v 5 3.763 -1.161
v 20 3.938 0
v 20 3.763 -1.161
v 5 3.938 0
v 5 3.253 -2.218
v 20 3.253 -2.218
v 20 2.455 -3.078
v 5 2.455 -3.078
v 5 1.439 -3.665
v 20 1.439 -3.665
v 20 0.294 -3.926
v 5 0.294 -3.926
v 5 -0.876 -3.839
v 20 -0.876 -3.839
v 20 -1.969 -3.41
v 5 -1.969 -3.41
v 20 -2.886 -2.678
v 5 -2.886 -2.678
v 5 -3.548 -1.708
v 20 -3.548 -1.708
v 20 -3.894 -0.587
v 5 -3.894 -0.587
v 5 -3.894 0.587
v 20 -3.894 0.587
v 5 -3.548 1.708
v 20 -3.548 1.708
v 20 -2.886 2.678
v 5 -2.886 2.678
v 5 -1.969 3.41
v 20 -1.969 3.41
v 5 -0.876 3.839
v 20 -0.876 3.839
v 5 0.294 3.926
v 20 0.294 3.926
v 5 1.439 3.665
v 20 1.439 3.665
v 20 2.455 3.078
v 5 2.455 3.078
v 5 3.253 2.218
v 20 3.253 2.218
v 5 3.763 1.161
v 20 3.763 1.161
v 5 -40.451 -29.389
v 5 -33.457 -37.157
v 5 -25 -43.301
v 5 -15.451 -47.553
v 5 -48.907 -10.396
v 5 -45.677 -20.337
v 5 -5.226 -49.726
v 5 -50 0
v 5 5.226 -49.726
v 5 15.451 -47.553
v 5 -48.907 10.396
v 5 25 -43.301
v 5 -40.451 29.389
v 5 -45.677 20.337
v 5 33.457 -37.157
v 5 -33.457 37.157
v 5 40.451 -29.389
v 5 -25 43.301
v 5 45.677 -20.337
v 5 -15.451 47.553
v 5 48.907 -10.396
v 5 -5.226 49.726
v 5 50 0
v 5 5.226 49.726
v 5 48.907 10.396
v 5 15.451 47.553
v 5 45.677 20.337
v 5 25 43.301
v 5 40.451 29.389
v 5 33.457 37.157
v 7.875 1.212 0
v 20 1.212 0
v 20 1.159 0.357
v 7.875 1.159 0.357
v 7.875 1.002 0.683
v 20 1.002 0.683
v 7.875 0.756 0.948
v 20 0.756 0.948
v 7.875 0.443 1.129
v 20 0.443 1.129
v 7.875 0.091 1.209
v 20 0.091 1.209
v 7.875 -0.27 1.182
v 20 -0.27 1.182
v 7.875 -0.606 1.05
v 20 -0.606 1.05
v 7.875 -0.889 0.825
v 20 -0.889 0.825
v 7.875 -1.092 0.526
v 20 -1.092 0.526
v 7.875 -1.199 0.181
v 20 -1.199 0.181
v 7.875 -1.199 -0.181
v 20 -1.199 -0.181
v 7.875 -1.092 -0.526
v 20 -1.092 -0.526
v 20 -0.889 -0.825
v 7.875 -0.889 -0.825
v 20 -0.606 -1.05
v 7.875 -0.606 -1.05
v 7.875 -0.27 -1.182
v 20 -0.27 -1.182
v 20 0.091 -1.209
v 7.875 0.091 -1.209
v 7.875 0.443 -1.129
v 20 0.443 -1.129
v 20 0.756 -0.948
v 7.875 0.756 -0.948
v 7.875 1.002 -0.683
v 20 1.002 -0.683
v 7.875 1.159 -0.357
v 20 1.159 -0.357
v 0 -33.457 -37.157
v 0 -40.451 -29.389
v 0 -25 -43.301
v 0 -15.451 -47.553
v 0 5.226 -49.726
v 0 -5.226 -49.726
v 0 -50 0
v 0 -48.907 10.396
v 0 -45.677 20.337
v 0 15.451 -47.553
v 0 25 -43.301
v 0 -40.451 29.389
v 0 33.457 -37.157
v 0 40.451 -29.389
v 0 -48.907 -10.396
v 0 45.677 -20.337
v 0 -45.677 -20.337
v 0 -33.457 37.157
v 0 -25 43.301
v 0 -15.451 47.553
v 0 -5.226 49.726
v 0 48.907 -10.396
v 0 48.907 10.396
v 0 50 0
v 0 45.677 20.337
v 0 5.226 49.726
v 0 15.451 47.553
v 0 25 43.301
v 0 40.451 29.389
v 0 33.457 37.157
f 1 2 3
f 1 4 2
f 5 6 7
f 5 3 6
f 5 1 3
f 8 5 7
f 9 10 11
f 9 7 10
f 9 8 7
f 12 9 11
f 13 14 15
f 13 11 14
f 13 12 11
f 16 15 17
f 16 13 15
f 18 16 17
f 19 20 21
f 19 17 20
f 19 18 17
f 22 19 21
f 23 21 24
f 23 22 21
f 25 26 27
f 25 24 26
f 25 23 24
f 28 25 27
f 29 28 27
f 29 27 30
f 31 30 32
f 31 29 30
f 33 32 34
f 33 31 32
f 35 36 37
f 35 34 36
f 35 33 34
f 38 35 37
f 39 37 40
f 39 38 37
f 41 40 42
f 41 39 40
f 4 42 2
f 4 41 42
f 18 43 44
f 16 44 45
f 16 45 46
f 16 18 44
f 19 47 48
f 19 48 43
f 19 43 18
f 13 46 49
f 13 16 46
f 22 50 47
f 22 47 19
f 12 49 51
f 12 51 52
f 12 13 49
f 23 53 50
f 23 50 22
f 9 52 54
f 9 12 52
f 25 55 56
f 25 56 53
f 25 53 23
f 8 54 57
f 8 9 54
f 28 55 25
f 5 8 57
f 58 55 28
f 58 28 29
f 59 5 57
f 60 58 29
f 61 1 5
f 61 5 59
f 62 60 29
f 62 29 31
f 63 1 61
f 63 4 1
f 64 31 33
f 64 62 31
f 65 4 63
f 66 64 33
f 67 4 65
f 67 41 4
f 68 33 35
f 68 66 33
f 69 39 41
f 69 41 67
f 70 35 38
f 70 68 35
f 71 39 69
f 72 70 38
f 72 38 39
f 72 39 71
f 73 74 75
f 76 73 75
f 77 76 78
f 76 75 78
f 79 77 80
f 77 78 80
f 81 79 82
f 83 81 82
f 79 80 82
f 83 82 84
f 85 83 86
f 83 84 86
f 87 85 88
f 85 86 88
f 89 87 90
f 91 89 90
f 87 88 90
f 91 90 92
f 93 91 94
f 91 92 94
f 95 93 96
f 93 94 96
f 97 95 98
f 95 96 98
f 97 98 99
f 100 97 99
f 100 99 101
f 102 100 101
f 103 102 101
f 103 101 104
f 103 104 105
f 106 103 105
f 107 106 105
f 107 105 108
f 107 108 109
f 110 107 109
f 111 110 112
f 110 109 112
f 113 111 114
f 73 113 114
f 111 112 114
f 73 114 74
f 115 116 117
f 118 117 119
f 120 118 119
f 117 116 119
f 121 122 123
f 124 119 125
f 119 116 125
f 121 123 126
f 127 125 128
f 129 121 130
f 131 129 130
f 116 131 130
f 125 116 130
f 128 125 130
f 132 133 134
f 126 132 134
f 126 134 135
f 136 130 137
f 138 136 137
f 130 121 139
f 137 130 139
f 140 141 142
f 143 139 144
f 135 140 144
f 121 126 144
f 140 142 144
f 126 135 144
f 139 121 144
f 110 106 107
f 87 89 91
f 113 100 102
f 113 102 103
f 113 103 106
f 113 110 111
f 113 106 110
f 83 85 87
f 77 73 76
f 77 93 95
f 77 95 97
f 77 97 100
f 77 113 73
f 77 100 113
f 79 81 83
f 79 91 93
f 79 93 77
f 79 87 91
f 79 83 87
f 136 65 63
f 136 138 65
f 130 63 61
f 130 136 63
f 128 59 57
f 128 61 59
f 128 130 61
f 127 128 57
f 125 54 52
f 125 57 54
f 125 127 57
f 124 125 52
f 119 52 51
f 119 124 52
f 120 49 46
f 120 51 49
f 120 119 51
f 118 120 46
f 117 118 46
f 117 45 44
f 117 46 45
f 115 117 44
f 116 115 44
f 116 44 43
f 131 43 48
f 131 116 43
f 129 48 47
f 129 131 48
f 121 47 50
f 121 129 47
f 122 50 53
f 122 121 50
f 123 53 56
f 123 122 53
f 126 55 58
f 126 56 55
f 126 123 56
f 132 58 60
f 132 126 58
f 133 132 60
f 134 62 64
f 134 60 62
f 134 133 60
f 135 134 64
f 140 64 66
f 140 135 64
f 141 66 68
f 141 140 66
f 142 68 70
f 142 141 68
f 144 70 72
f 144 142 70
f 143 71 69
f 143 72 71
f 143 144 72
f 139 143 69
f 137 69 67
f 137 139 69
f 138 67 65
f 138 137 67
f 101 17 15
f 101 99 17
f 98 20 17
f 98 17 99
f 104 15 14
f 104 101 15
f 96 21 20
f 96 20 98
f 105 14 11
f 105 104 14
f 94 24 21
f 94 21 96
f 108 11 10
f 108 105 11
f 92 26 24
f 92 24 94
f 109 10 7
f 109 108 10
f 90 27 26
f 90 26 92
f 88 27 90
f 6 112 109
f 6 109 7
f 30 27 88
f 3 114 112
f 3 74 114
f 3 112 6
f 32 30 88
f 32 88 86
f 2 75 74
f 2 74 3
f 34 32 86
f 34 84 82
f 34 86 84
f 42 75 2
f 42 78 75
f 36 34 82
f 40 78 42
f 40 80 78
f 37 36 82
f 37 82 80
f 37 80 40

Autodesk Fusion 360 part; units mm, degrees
sketch "Sketch1" plane through (0, 0, 0) normal (1, 0, 0) x (0, 1, 0)
  circle A0 centre (0, 0) radius 50
  dimension "d1" = 100
extrude "Extrude1" add sketch "Sketch1" along normal blind 5
sketch "Sketch2" plane through (5, 0, 0) normal (1, 0, 0) x (0, 1, 0)
  circle A0 centre (0, 0) radius 50
  circle A1 centre (0, 0) radius 3.9375
  dimension "d4" = 7.875
extrude "Extrude3" add sketch "Sketch2" along normal blind 15 contours A1
sketch "Sketch3" plane through (20, 0, 0) normal (1, 0, 0) x (0, 1, 0)
  circle A0 centre (0, 0) radius 3.9375
  circle A1 centre (0, 0) radius 1.2125
  dimension "d10" = 2.425
extrude "Extrude4" cut sketch "Sketch3" against normal blind 12.125 contours A1
sketch "Sketch4" plane through (5, 0, 0) normal (1, 0, 0) x (0, 1, 0)
  circle A0 centre (0, 0) radius 50
  line L0 (-33.6779, 28.9291) -> (-27.8766, 32.541)
  line L1 (-27.8766, 32.541) -> (-24.8659, 32.541)
  spline S0 degree 3 poles (-24.8659, 32.541) (-24.773, 32.541) (-24.6881, 32.4676) (-24.6881, 32.363) knots 0 0 0 0 1 1 1 1
  spline S1 degree 3 poles (-24.6881, 32.363) (-24.6881, 32.2781) (-24.7268, 32.2432) (-24.773, 32.2162) knots 0 0 0 0 1 1 1 1
  line L2 (-24.773, 32.2162) -> (-27.6216, 30.5068)
  spline S2 degree 3 poles (-27.6216, 30.5068) (-27.8071, 30.3947) (-27.8728, 30.1742) (-27.8728, 30.008) knots 0 0 0 0 1 1 1 1
  line L3 (-27.8728, 30.008) -> (-27.8766, 28.9291)
  line L4 (-27.8766, 28.9291) -> (-24.2551, 28.9291)
  line L5 (-24.2551, 28.9291) -> (-24.2551, 35.1902)
  spline S3 degree 3 poles (-24.2551, 35.1902) (-24.2551, 35.31) (-24.348, 35.4144) (-24.4871, 35.4144) knots 0 0 0 0 1 1 1 1
  line L6 (-24.4871, 35.4144) -> (-27.9423, 35.4144)
  line L7 (-27.9423, 35.4144) -> (-33.7281, 31.8179)
  line L8 (-33.7281, 31.8179) -> (-33.7281, 28.9291)
  line L9 (-33.7281, 28.9291) -> (-33.6779, 28.9291)
  line L10 (13.8915, 28.9289) -> (19.1092, 28.9289)
  line L11 (19.1092, 28.9289) -> (19.1092, 30.3328)
  line L12 (19.1092, 30.3328) -> (15.5457, 30.3328)
  line L13 (15.5457, 30.3328) -> (15.5457, 31.5083)
  line L14 (15.5457, 31.5083) -> (18.4135, 31.5083)
  line L15 (18.4135, 31.5083) -> (18.4135, 32.9161)
  line L16 (18.4135, 32.9161) -> (15.5457, 32.9161)
  line L17 (15.5457, 32.9161) -> (15.5457, 34.0104)
  line L18 (15.5457, 34.0104) -> (19.1092, 34.0104)
  line L19 (19.1092, 34.0104) -> (19.1092, 35.4144)
  line L20 (19.1092, 35.4144) -> (13.8915, 35.4144)
  line L21 (13.8915, 35.4144) -> (13.8915, 28.9289)
  line L22 (-18.8945, 35.4144) -> (-21.3798, 28.9289)
  line L23 (-21.3798, 28.9289) -> (-19.6714, 28.9289)
  line L24 (-19.6714, 28.9289) -> (-19.2386, 30.1433)
  line L25 (-19.2386, 30.1433) -> (-16.4635, 30.1433)
  line L26 (-16.4635, 30.1433) -> (-16.0384, 28.9289)
  line L27 (-16.0384, 28.9289) -> (-14.2721, 28.9289)
  line L28 (-14.2721, 28.9289) -> (-16.7881, 35.4144)
  line L29 (-16.7881, 35.4144) -> (-18.8945, 35.4144)
  line L30 (-18.7477, 31.5238) -> (-17.8394, 34.0646)
  line L31 (-17.8394, 34.0646) -> (-16.9467, 31.5238)
  line L32 (-16.9467, 31.5238) -> (-18.7477, 31.5238)
  line L33 (-7.1839, 34.0104) -> (-5.093, 34.0104)
  line L34 (-5.093, 34.0104) -> (-5.093, 28.9289)
  line L35 (-5.093, 28.9289) -> (-3.4426, 28.9289)
  line L36 (-3.4426, 28.9289) -> (-3.4426, 34.0104)
  line L37 (-3.4426, 34.0104) -> (-1.3594, 34.0104)
  line L38 (-1.3594, 34.0104) -> (-1.3594, 35.4144)
  line L39 (-1.3594, 35.4144) -> (-7.1839, 35.4144)
  line L40 (-7.1839, 35.4144) -> (-7.1839, 34.0104)
  spline S4 degree 3 poles (-9.5878, 31.4272) (-9.5878, 30.584) (-10.1057, 30.2437) (-10.9908, 30.2437) knots 0 0 0 0 1 1 1 1
  spline S5 degree 3 poles (-10.9908, 30.2437) (-11.8488, 30.2437) (-12.4092, 30.5995) (-12.4092, 31.4272) knots 0 0 0 0 1 1 1 1
  line L41 (-12.4092, 31.4272) -> (-12.4092, 35.4376)
  line L42 (-12.4092, 35.4376) -> (-14.0634, 35.4376)
  line L43 (-14.0634, 35.4376) -> (-14.0634, 31.2377)
  spline S6 degree 3 poles (-14.0634, 31.2377) (-14.0634, 29.366) (-12.3937, 28.782) (-10.9947, 28.782) knots 0 0 0 0 1 1 1 1
  spline S7 degree 3 poles (-10.9947, 28.782) (-9.6033, 28.782) (-7.9414, 29.366) (-7.9414, 31.2377) knots 0 0 0 0 1 1 1 1
  line L44 (-7.9414, 31.2377) -> (-7.9414, 35.4376)
  line L45 (-7.9414, 35.4376) -> (-9.5955, 35.4376)
  line L46 (-9.5955, 35.4376) -> (-9.5955, 31.4272)
  line L47 (-9.5955, 31.4272) -> (-9.5878, 31.4272)
  line L48 (32.7484, 35.4144) -> (30.7811, 35.4144)
  line L49 (30.7811, 35.4144) -> (28.4237, 32.7807)
  line L50 (28.4237, 32.7807) -> (28.4237, 35.4144)
  line L51 (28.4237, 35.4144) -> (26.7693, 35.4144)
  line L52 (26.7693, 35.4144) -> (26.7771, 28.9289)
  line L53 (26.7771, 28.9289) -> (28.4237, 28.9289)
  line L54 (28.4237, 28.9289) -> (28.4237, 31.3923)
  line L55 (28.4237, 31.3923) -> (30.6575, 28.9289)
  line L56 (30.6575, 28.9289) -> (32.7484, 28.9289)
  line L57 (32.7484, 28.9289) -> (29.7338, 32.131)
  line L58 (29.7338, 32.131) -> (32.7484, 35.4144)
  line L59 (10.0033, 35.4144) -> (6.9732, 35.4144)
  line L60 (6.9732, 35.4144) -> (6.9732, 28.9289)
  line L61 (6.9732, 28.9289) -> (10.0033, 28.9289)
  spline S8 degree 3 poles (10.0033, 28.9289) (12.3262, 28.9289) (12.9678, 29.7952) (12.9678, 32.2199) knots 0 0 0 0 1 1 1 1
  spline S9 degree 3 poles (12.9678, 32.2199) (12.9678, 34.4978) (12.3532, 35.4144) (10.0033, 35.4144) knots 0 0 0 0 1 1 1 1
  line L62 (9.9377, 30.3328) -> (8.6236, 30.3328)
  line L63 (8.6236, 30.3328) -> (8.6236, 34.0104)
  line L64 (8.6236, 34.0104) -> (9.9377, 34.0104)
  spline S10 degree 3 poles (9.9377, 34.0104) (10.9735, 34.0104) (11.2827, 33.7283) (11.2827, 32.2199) knots 0 0 0 0 1 1 1 1
  spline S11 degree 3 poles (11.2827, 32.2199) (11.2827, 30.8432) (10.9348, 30.3328) (9.9377, 30.3328) knots 0 0 0 0 1 1 1 1
  line L65 (24.1065, 32.7458) -> (22.5992, 32.9161)
  spline S12 degree 3 poles (22.5992, 32.9161) (21.7179, 33.0127) (21.4976, 33.2332) (21.4976, 33.531) knots 0 0 0 0 1 1 1 1
  spline S13 degree 3 poles (21.4976, 33.531) (21.4976, 33.8636) (21.9499, 34.1613) (22.8349, 34.1613) knots 0 0 0 0 1 1 1 1
  spline S14 degree 3 poles (22.8349, 34.1613) (23.6852, 34.1613) (24.1297, 33.8442) (24.2109, 33.3685) knots 0 0 0 0 1 1 1 1
  line L66 (24.2109, 33.3685) -> (25.8303, 33.3685)
  spline S15 degree 3 poles (25.8303, 33.3685) (25.7489, 34.7415) (24.6012, 35.5922) (22.9238, 35.5922) knots 0 0 0 0 1 1 1 1
  spline S16 degree 3 poles (22.9238, 35.5922) (20.9295, 35.5922) (19.9286, 34.7994) (19.9286, 33.3955) knots 0 0 0 0 1 1 1 1
  spline S17 degree 3 poles (19.9286, 33.3955) (19.9286, 32.2547) (20.5933, 31.7171) (21.9691, 31.5703) knots 0 0 0 0 1 1 1 1
  line L67 (21.9691, 31.5703) -> (23.4997, 31.4077)
  spline S18 degree 3 poles (23.4997, 31.4077) (24.0833, 31.3421) (24.35, 31.1178) (24.35, 30.8239) knots 0 0 0 0 1 1 1 1
  spline S19 degree 3 poles (24.35, 30.8239) (24.35, 30.4914) (23.9596, 30.1935) (23.0204, 30.1935) knots 0 0 0 0 1 1 1 1
  spline S20 degree 3 poles (23.0204, 30.1935) (21.9344, 30.1935) (21.4976, 30.4681) (21.4242, 31.0212) knots 0 0 0 0 1 1 1 1
  line L68 (21.4242, 31.0212) -> (19.8357, 31.0212)
  spline S21 degree 3 poles (19.8357, 31.0212) (19.9091, 29.5283) (20.8793, 28.7665) (22.9625, 28.7665) knots 0 0 0 0 1 1 1 1
  spline S22 degree 3 poles (22.9625, 28.7665) (24.8639, 28.7665) (25.9267, 29.6018) (25.9267, 30.8587) knots 0 0 0 0 1 1 1 1
  spline S23 degree 3 poles (25.9267, 30.8587) (25.9267, 31.953) (25.2969, 32.6105) (24.1065, 32.7458) knots 0 0 0 0 1 1 1 1
  spline S24 degree 3 poles (2.4861, 35.5922) (0.1285, 35.5922) (-1.0927, 34.142) (-1.0927, 32.189) knots 0 0 0 0 1 1 1 1
  spline S25 degree 3 poles (-1.0927, 32.189) (-1.0927, 30.2282) (0.1285, 28.7703) (2.4861, 28.7703) knots 0 0 0 0 1 1 1 1
  spline S26 degree 3 poles (2.4861, 28.7703) (4.8515, 28.7703) (6.0729, 30.2282) (6.0729, 32.189) knots 0 0 0 0 1 1 1 1
  spline S27 degree 3 poles (6.0729, 32.189) (6.0767, 34.142) (4.8515, 35.5922) (2.4861, 35.5922) knots 0 0 0 0 1 1 1 1
  spline S28 degree 3 poles (2.4861, 30.2282) (1.2647, 30.2282) (0.5924, 30.9747) (0.5924, 32.189) knots 0 0 0 0 1 1 1 1
  spline S29 degree 3 poles (0.5924, 32.189) (0.5924, 33.3802) (1.2647, 34.1343) (2.4861, 34.1343) knots 0 0 0 0 1 1 1 1
  spline S30 degree 3 poles (2.4861, 34.1343) (3.719, 34.1343) (4.38, 33.3802) (4.38, 32.189) knots 0 0 0 0 1 1 1 1
  spline S31 degree 3 poles (4.38, 32.189) (4.3838, 30.9708) (3.719, 30.2282) (2.4861, 30.2282) knots 0 0 0 0 1 1 1 1
extrude "Extrude5" cut sketch "Sketch4" along normal blind 1 contours L0 L1 S0 S1 L2 S2 L3 L4 L5 S3 L6 L7 L8 L9 | L10 L11 L12 L13 L14 L15 L16 L17 L18 L19 L20 L21 | L22 L23 L24 L25 L26 L27 L28 L29 | L33 L34 L35 L36 L37 L38 L39 L40 | S4 S5 L41 L42 L43 S6 S7 L44 L45 L46 L47 | L48 L49 L50 L51 L52 L53 L54 L55 L56 L57 L58 | L59 L60 L61 S8 S9 | L65 S12 S13 S14 L66 S15 S16 S17 L67 S18 S19 S20 L68 S21 S22 S23 | S24 S25 S26 S27
sketch "Sketch5" plane through (5, 0, 0) normal (1, 0, 0) x (0, 1, 0)
  circle A0 centre (0, 0) radius 50
  circle A1 centre (0, 0) radius 3.9375
  spline S0 degree 3 poles (6.2324, -42.9698) (7.0803, -42.8865) (7.5571, -42.7606) (8.0991, -42.484) knots 0 0 0 0 1 1 1 1
  spline S1 degree 3 poles (8.0991, -42.484) (8.5579, -42.2478) (9.0099, -41.7778) (9.2573, -41.2785) knots 0 0 0 0 1 1 1 1
  spline S2 degree 3 poles (9.2573, -41.2785) (9.3293, -41.1301) (9.4327, -40.831) (9.4485, -40.723) knots 0 0 0 0 1 1 1 1
  spline S3 degree 3 poles (9.4485, -40.723) (9.453, -40.6871) (9.4574, -40.6556) (9.4597, -40.6556) knots 0 0 0 0 1 1 1 1
  spline S4 degree 3 poles (9.4597, -40.6556) (9.4619, -40.6556) (9.4664, -40.6263) (9.4709, -40.5881) knots 0 0 0 0 1 1 1 1
  spline S5 degree 3 poles (9.4709, -40.5881) (9.4732, -40.5521) (9.4889, -40.4352) (9.5047, -40.3295) knots 0 0 0 0 1 1 1 1
  spline S6 degree 3 poles (9.5047, -40.3295) (9.5429, -40.0619) (9.5384, -39.4276) (9.4934, -39.1038) knots 0 0 0 0 1 1 1 1
  spline S7 degree 3 poles (9.4934, -39.1038) (9.4732, -38.9554) (9.4552, -38.7957) (9.4574, -38.7507) knots 0 0 0 0 1 1 1 1
  spline S8 degree 3 poles (9.4574, -38.7507) (9.4574, -38.7035) (9.4462, -38.6608) (9.435, -38.654) knots 0 0 0 0 1 1 1 1
  spline S9 degree 3 poles (9.435, -38.654) (9.4237, -38.645) (9.4192, -38.6315) (9.426, -38.6203) knots 0 0 0 0 1 1 1 1
  spline S10 degree 3 poles (9.426, -38.6203) (9.4327, -38.609) (9.426, -38.5528) (9.4147, -38.4921) knots 0 0 0 0 1 1 1 1
  line L0 (9.4147, -38.4921) -> (9.39, -38.3796)
  line L1 (9.39, -38.3796) -> (9.1718, -38.3526)
  spline S11 degree 3 poles (9.1718, -38.3526) (8.4657, -38.2627) (7.5346, -38.076) (7.0443, -37.9298) knots 0 0 0 0 1 1 1 1
  spline S12 degree 3 poles (7.0443, -37.9298) (7.0196, -37.9231) (7.0601, -37.9658) (7.1343, -38.0243) knots 0 0 0 0 1 1 1 1
  spline S13 degree 3 poles (7.1343, -38.0243) (7.6313, -38.4246) (7.9956, -38.9351) (8.1688, -39.4861) knots 0 0 0 0 1 1 1 1
  spline S14 degree 3 poles (8.1688, -39.4861) (8.2295, -39.675) (8.234, -39.7133) (8.234, -40.0708) knots 0 0 0 0 1 1 1 1
  spline S15 degree 3 poles (8.234, -40.0708) (8.234, -40.4284) (8.2295, -40.4667) (8.1688, -40.6556) knots 0 0 0 0 1 1 1 1
  spline S16 degree 3 poles (8.1688, -40.6556) (8.0563, -41.0177) (7.8697, -41.373) (7.6943, -41.5642) knots 0 0 0 0 1 1 1 1
  spline S17 degree 3 poles (7.6943, -41.5642) (7.4469, -41.834) (7.0061, -42.0319) (6.4888, -42.1084) knots 0 0 0 0 1 1 1 1
  spline S18 degree 3 poles (6.4888, -42.1084) (6.1807, -42.1534) (5.6005, -42.1219) (5.2069, -42.0409) knots 0 0 0 0 1 1 1 1
  spline S19 degree 3 poles (5.2069, -42.0409) (4.6627, -41.9285) (3.97, -41.6946) (3.437, -41.4427) knots 0 0 0 0 1 1 1 1
  line L2 (3.437, -41.4427) -> (3.2301, -41.3438)
  line L3 (3.2301, -41.3438) -> (3.2301, -41.9937)
  line L4 (3.2301, -41.9937) -> (3.2301, -42.6437)
  line L5 (3.2301, -42.6437) -> (3.3245, -42.6706)
  spline S20 degree 3 poles (3.3245, -42.6706) (3.6484, -42.7584) (4.3028, -42.8731) (4.7819, -42.927) knots 0 0 0 0 1 1 1 1
  spline S21 degree 3 poles (4.7819, -42.927) (5.0697, -42.9608) (6.0413, -42.99) (6.2324, -42.9698) knots 0 0 0 0 1 1 1 1
  line L6 (19.3956, -42.8213) -> (19.3888, -42.7021)
  line L7 (19.3888, -42.7021) -> (19.164, -42.6751)
  spline S22 degree 3 poles (19.164, -42.6751) (19.0403, -42.6616) (18.8648, -42.6437) (18.7726, -42.6347) knots 0 0 0 0 1 1 1 1
  spline S23 degree 3 poles (18.7726, -42.6347) (18.4825, -42.6122) (17.909, -42.4975) (17.2298, -42.3288) knots 0 0 0 0 1 1 1 1
  spline S24 degree 3 poles (17.2298, -42.3288) (16.8948, -42.2456) (16.8475, -42.2276) (16.8025, -42.1601) knots 0 0 0 0 1 1 1 1
  spline S25 degree 3 poles (16.8025, -42.1601) (16.7373, -42.0612) (16.7598, -41.9442) (16.8948, -41.6609) knots 0 0 0 0 1 1 1 1
  spline S26 degree 3 poles (16.8948, -41.6609) (17.0792, -41.2808) (17.5357, -40.28) (17.5447, -40.2395) knots 0 0 0 0 1 1 1 1
  spline S27 degree 3 poles (17.5447, -40.2395) (17.5537, -40.2035) (17.6594, -39.9674) (17.8686, -39.5311) knots 0 0 0 0 1 1 1 1
  spline S28 degree 3 poles (17.8686, -39.5311) (17.963, -39.3332) (18.5702, -38.0018) (18.5792, -37.9771) knots 0 0 0 0 1 1 1 1
  spline S29 degree 3 poles (18.5792, -37.9771) (18.5792, -37.9748) (18.7569, -37.9456) (18.9728, -37.9141) knots 0 0 0 0 1 1 1 1
  spline S30 degree 3 poles (18.9728, -37.9141) (19.5305, -37.8286) (20.4504, -37.6667) (21.0418, -37.552) knots 0 0 0 0 1 1 1 1
  spline S31 degree 3 poles (21.0418, -37.552) (21.5456, -37.4508) (21.6738, -37.4283) (21.739, -37.4261) knots 0 0 0 0 1 1 1 1
  spline S32 degree 3 poles (21.739, -37.4261) (21.9414, -37.4148) (23.8418, -36.9448) (24.359, -36.7784) knots 0 0 0 0 1 1 1 1
  spline S33 degree 3 poles (24.359, -36.7784) (24.5322, -36.7221) (24.4445, -36.7177) (24.1994, -36.7671) knots 0 0 0 0 1 1 1 1
  spline S34 degree 3 poles (24.1994, -36.7671) (24.0779, -36.7919) (23.97, -36.8009) (23.8598, -36.7896) knots 0 0 0 0 1 1 1 1
  spline S35 degree 3 poles (23.8598, -36.7896) (23.7248, -36.7784) (23.6079, -36.7941) (23.1626, -36.8773) knots 0 0 0 0 1 1 1 1
  spline S36 degree 3 poles (23.1626, -36.8773) (21.6558, -37.1562) (20.1063, -37.3384) (19.2292, -37.3384) knots 0 0 0 0 1 1 1 1
  spline S37 degree 3 poles (19.2292, -37.3384) (18.9458, -37.3384) (18.9053, -37.3339) (18.9053, -37.3024) knots 0 0 0 0 1 1 1 1
  spline S38 degree 3 poles (18.9053, -37.3024) (18.9053, -37.2664) (19.3079, -36.3601) (19.3641, -36.2701) knots 0 0 0 0 1 1 1 1
  spline S39 degree 3 poles (19.3641, -36.2701) (19.4023, -36.2094) (19.6272, -35.7169) (19.6362, -35.6741) knots 0 0 0 0 1 1 1 1
  spline S40 degree 3 poles (19.6362, -35.6741) (19.6452, -35.6337) (20.1647, -34.4957) (20.2412, -34.3472) knots 0 0 0 0 1 1 1 1
  spline S41 degree 3 poles (20.2412, -34.3472) (20.3042, -34.2258) (20.6145, -33.5444) (20.6145, -33.5264) knots 0 0 0 0 1 1 1 1
  spline S42 degree 3 poles (20.6145, -33.5264) (20.6145, -33.5084) (21.0598, -32.5346) (21.1565, -32.3412) knots 0 0 0 0 1 1 1 1
  line L8 (21.1565, -32.3412) -> (21.2442, -32.1658)
  line L9 (21.2442, -32.1658) -> (20.7427, -32.1658)
  line L10 (20.7427, -32.1658) -> (20.2412, -32.1658)
  line L11 (20.2412, -32.1658) -> (20.0883, -32.4874)
  spline S43 degree 3 poles (20.0883, -32.4874) (20.0028, -32.6628) (19.8634, -32.9641) (19.7779, -33.1553) knots 0 0 0 0 1 1 1 1
  spline S44 degree 3 poles (19.7779, -33.1553) (19.4023, -33.9874) (19.3191, -34.1718) (19.1977, -34.426) knots 0 0 0 0 1 1 1 1
  spline S45 degree 3 poles (19.1977, -34.426) (19.0403, -34.7543) (18.6782, -35.5414) (18.6354, -35.6516) knots 0 0 0 0 1 1 1 1
  spline S46 degree 3 poles (18.6354, -35.6516) (18.6175, -35.6944) (18.5095, -35.9328) (18.3926, -36.1802) knots 0 0 0 0 1 1 1 1
  spline S47 degree 3 poles (18.3926, -36.1802) (18.2779, -36.4275) (18.1047, -36.7986) (18.0102, -37.0055) knots 0 0 0 0 1 1 1 1
  spline S48 degree 3 poles (18.0102, -37.0055) (17.8416, -37.3698) (17.8348, -37.3833) (17.7584, -37.3991) knots 0 0 0 0 1 1 1 1
  spline S49 degree 3 poles (17.7584, -37.3991) (17.6302, -37.4283) (15.5206, -37.4193) (14.9696, -37.3878) knots 0 0 0 0 1 1 1 1
  spline S50 degree 3 poles (14.9696, -37.3878) (14.5693, -37.3631) (14.4501, -37.3496) (14.3962, -37.3181) knots 0 0 0 0 1 1 1 1
  spline S51 degree 3 poles (14.3962, -37.3181) (14.3399, -37.2866) (14.2995, -37.2124) (14.1533, -36.8773) knots 0 0 0 0 1 1 1 1
  spline S52 degree 3 poles (14.1533, -36.8773) (13.8991, -36.2903) (13.5056, -35.3503) (13.4966, -35.3031) knots 0 0 0 0 1 1 1 1
  spline S53 degree 3 poles (13.4966, -35.3031) (13.4921, -35.2896) (13.4269, -35.1321) (13.3504, -34.9545) knots 0 0 0 0 1 1 1 1
  spline S54 degree 3 poles (13.3504, -34.9545) (13.2739, -34.7746) (13.0918, -34.345) (12.9478, -33.9987) knots 0 0 0 0 1 1 1 1
  spline S55 degree 3 poles (12.9478, -33.9987) (12.8017, -33.6523) (12.651, -33.3037) (12.615, -33.2228) knots 0 0 0 0 1 1 1 1
  spline S56 degree 3 poles (12.615, -33.2228) (12.5408, -33.0586) (12.4845, -32.9259) (12.4845, -32.9057) knots 0 0 0 0 1 1 1 1
  spline S57 degree 3 poles (12.4845, -32.9057) (12.4845, -32.8989) (12.4238, -32.746) (12.3496, -32.5661) knots 0 0 0 0 1 1 1 1
  line L12 (12.3496, -32.5661) -> (12.2147, -32.24)
  line L13 (12.2147, -32.24) -> (11.965, -32.2265)
  spline S58 degree 3 poles (11.965, -32.2265) (11.5962, -32.2085) (11.3353, -32.123) (11.034, -31.9184) knots 0 0 0 0 1 1 1 1
  spline S59 degree 3 poles (11.034, -31.9184) (10.8293, -31.7767) (10.5167, -31.617) (10.5167, -31.653) knots 0 0 0 0 1 1 1 1
  spline S60 degree 3 poles (10.5167, -31.653) (10.5167, -31.671) (10.528, -31.6957) (10.5437, -31.7115) knots 0 0 0 0 1 1 1 1
  spline S61 degree 3 poles (10.5437, -31.7115) (10.5594, -31.7272) (10.5639, -31.7385) (10.5549, -31.7385) knots 0 0 0 0 1 1 1 1
  spline S62 degree 3 poles (10.5549, -31.7385) (10.5414, -31.7385) (10.6449, -31.9948) (10.7416, -32.1995) knots 0 0 0 0 1 1 1 1
  spline S63 degree 3 poles (10.7416, -32.1995) (10.7641, -32.249) (10.899, -32.5683) (11.043, -32.9079) knots 0 0 0 0 1 1 1 1
  spline S64 degree 3 poles (11.043, -32.9079) (11.1846, -33.2475) (11.3623, -33.6726) (11.4388, -33.8525) knots 0 0 0 0 1 1 1 1
  spline S65 degree 3 poles (11.4388, -33.8525) (11.5152, -34.0324) (11.5805, -34.1943) (11.585, -34.2123) knots 0 0 0 0 1 1 1 1
  spline S66 degree 3 poles (11.585, -34.2123) (11.5917, -34.2528) (12.0258, -35.2963) (12.1022, -35.4605) knots 0 0 0 0 1 1 1 1
  spline S67 degree 3 poles (12.1022, -35.4605) (12.1809, -35.6314) (12.5655, -36.558) (12.5745, -36.5985) knots 0 0 0 0 1 1 1 1
  spline S68 degree 3 poles (12.5745, -36.5985) (12.579, -36.6187) (12.6285, -36.7446) (12.6847, -36.8796) knots 0 0 0 0 1 1 1 1
  spline S69 degree 3 poles (12.6847, -36.8796) (12.7927, -37.1337) (12.8039, -37.1809) (12.7634, -37.1809) knots 0 0 0 0 1 1 1 1
  spline S70 degree 3 poles (12.7634, -37.1809) (12.7499, -37.1809) (12.489, -37.1495) (12.1832, -37.1112) knots 0 0 0 0 1 1 1 1
  spline S71 degree 3 poles (12.1832, -37.1112) (11.3758, -37.0123) (10.5729, -36.8818) (9.8195, -36.7289) knots 0 0 0 0 1 1 1 1
  spline S72 degree 3 poles (9.8195, -36.7289) (9.4552, -36.6547) (9.0999, -36.5827) (9.0324, -36.5692) knots 0 0 0 0 1 1 1 1
  spline S73 degree 3 poles (9.0324, -36.5692) (8.83, -36.531) (8.0968, -36.3331) (7.7955, -36.2386) knots 0 0 0 0 1 1 1 1
  spline S74 degree 3 poles (7.7955, -36.2386) (7.1455, -36.034) (6.174, -35.6404) (5.8051, -35.4357) knots 0 0 0 0 1 1 1 1
  spline S75 degree 3 poles (5.8051, -35.4357) (4.9258, -34.9455) (4.3186, -34.4102) (4.042, -33.875) knots 0 0 0 0 1 1 1 1
  spline S76 degree 3 poles (4.042, -33.875) (3.9003, -33.6006) (3.8733, -33.4949) (3.8913, -33.2745) knots 0 0 0 0 1 1 1 1
  spline S77 degree 3 poles (3.8913, -33.2745) (3.9318, -32.782) (4.1432, -32.3254) (4.5435, -31.8666) knots 0 0 0 0 1 1 1 1
  spline S78 degree 3 poles (4.5435, -31.8666) (5.0135, -31.3291) (6.012, -30.6814) (7.0128, -30.2631) knots 0 0 0 0 1 1 1 1
  spline S79 degree 3 poles (7.0128, -30.2631) (7.1568, -30.2047) (7.2737, -30.1529) (7.2715, -30.1484) knots 0 0 0 0 1 1 1 1
  spline S80 degree 3 poles (7.2715, -30.1484) (7.2647, -30.1417) (7.1568, -30.1709) (6.5473, -30.3464) knots 0 0 0 0 1 1 1 1
  spline S81 degree 3 poles (6.5473, -30.3464) (5.6207, -30.614) (4.6694, -31.0143) (4.1297, -31.3674) knots 0 0 0 0 1 1 1 1
  spline S82 degree 3 poles (4.1297, -31.3674) (4.0262, -31.4348) (3.9273, -31.4911) (3.9115, -31.4911) knots 0 0 0 0 1 1 1 1
  spline S83 degree 3 poles (3.9115, -31.4911) (3.8958, -31.4911) (3.8823, -31.5023) (3.8823, -31.5136) knots 0 0 0 0 1 1 1 1
  spline S84 degree 3 poles (3.8823, -31.5136) (3.8823, -31.5271) (3.8733, -31.5361) (3.8598, -31.5361) knots 0 0 0 0 1 1 1 1
  spline S85 degree 3 poles (3.8598, -31.5361) (3.8485, -31.5361) (3.8193, -31.5495) (3.7991, -31.5675) knots 0 0 0 0 1 1 1 1
  spline S86 degree 3 poles (3.7991, -31.5675) (3.7766, -31.5855) (3.6574, -31.68) (3.5314, -31.7789) knots 0 0 0 0 1 1 1 1
  spline S87 degree 3 poles (3.5314, -31.7789) (3.2728, -31.9858) (2.9872, -32.2805) (2.832, -32.4986) knots 0 0 0 0 1 1 1 1
  spline S88 degree 3 poles (2.832, -32.4986) (2.7735, -32.5818) (2.7196, -32.6538) (2.7106, -32.6605) knots 0 0 0 0 1 1 1 1
  spline S89 degree 3 poles (2.7106, -32.6605) (2.6521, -32.7055) (2.4317, -33.2565) (2.4452, -33.3262) knots 0 0 0 0 1 1 1 1
  spline S90 degree 3 poles (2.4452, -33.3262) (2.4474, -33.3375) (2.4474, -33.351) (2.4429, -33.3577) knots 0 0 0 0 1 1 1 1
  spline S91 degree 3 poles (2.4429, -33.3577) (2.4384, -33.3712) (2.4384, -33.7468) (2.4429, -33.7625) knots 0 0 0 0 1 1 1 1
  spline S92 degree 3 poles (2.4429, -33.7625) (2.4452, -33.7693) (2.4497, -33.7985) (2.4564, -33.83) knots 0 0 0 0 1 1 1 1
  spline S93 degree 3 poles (2.4564, -33.83) (2.4699, -33.9154) (2.6296, -34.2258) (2.7623, -34.426) knots 0 0 0 0 1 1 1 1
  spline S94 degree 3 poles (2.7623, -34.426) (2.895, -34.6239) (3.2886, -35.0444) (3.5202, -35.2333) knots 0 0 0 0 1 1 1 1
  spline S95 degree 3 poles (3.5202, -35.2333) (3.6551, -35.3435) (3.952, -35.5459) (4.3141, -35.7753) knots 0 0 0 0 1 1 1 1
  spline S96 degree 3 poles (4.3141, -35.7753) (4.584, -35.9463) (5.5285, -36.3916) (5.6927, -36.4253) knots 0 0 0 0 1 1 1 1
  spline S97 degree 3 poles (5.6927, -36.4253) (5.7174, -36.432) (5.9041, -36.4973) (6.1065, -36.5737) knots 0 0 0 0 1 1 1 1
  spline S98 degree 3 poles (6.1065, -36.5737) (6.3089, -36.6502) (6.6935, -36.7761) (6.9611, -36.8548) knots 0 0 0 0 1 1 1 1
  spline S99 degree 3 poles (6.9611, -36.8548) (7.2287, -36.9358) (7.4761, -37.01) (7.5143, -37.0213) knots 0 0 0 0 1 1 1 1
  spline S100 degree 3 poles (7.5143, -37.0213) (7.719, -37.0887) (9.1426, -37.4171) (9.3203, -37.4396) knots 0 0 0 0 1 1 1 1
  spline S101 degree 3 poles (9.3203, -37.4396) (9.3652, -37.4463) (9.444, -37.4576) (9.4934, -37.4621) knots 0 0 0 0 1 1 1 1
  spline S102 degree 3 poles (9.4934, -37.4621) (9.5429, -37.4688) (9.7453, -37.5048) (9.9432, -37.5408) knots 0 0 0 0 1 1 1 1
  spline S103 degree 3 poles (9.9432, -37.5408) (10.8158, -37.6982) (12.3564, -37.9029) (13.0468, -37.9501) knots 0 0 0 0 1 1 1 1
  line L14 (13.0468, -37.9501) -> (13.1367, -37.9568)
  line L15 (13.1367, -37.9568) -> (13.2829, -38.3077)
  spline S104 degree 3 poles (13.2829, -38.3077) (13.3639, -38.5011) (13.4493, -38.7035) (13.4718, -38.7575) knots 0 0 0 0 1 1 1 1
  spline S105 degree 3 poles (13.4718, -38.7575) (13.4966, -38.8114) (13.5348, -38.8991) (13.5573, -38.9531) knots 0 0 0 0 1 1 1 1
  spline S106 degree 3 poles (13.5573, -38.9531) (13.582, -39.0071) (13.6045, -39.0678) (13.609, -39.0881) knots 0 0 0 0 1 1 1 1
  spline S107 degree 3 poles (13.609, -39.0881) (13.6158, -39.1263) (14.1263, -40.37) (14.2095, -40.5544) knots 0 0 0 0 1 1 1 1
  spline S108 degree 3 poles (14.2095, -40.5544) (14.2905, -40.7275) (14.5896, -41.463) (14.5986, -41.5057) knots 0 0 0 0 1 1 1 1
  spline S109 degree 3 poles (14.5986, -41.5057) (14.6031, -41.5259) (14.6143, -41.5574) (14.6256, -41.5732) knots 0 0 0 0 1 1 1 1
  spline S110 degree 3 poles (14.6256, -41.5732) (14.6346, -41.5866) (14.6435, -41.6114) (14.6458, -41.6226) knots 0 0 0 0 1 1 1 1
  spline S111 degree 3 poles (14.6458, -41.6226) (14.6503, -41.6429) (14.8055, -42.0229) (15.0933, -42.7021) knots 0 0 0 0 1 1 1 1
  line L16 (15.0933, -42.7021) -> (15.1878, -42.927)
  line L17 (15.1878, -42.927) -> (17.2951, -42.9338)
  line L18 (17.2951, -42.9338) -> (19.4023, -42.9383)
  line L19 (19.4023, -42.9383) -> (19.3956, -42.8213)
  spline S112 degree 3 poles (15.9682, -41.301) (15.9457, -41.2853) (15.8085, -40.9682) (15.3295, -39.8235) knots 0 0 0 0 1 1 1 1
  spline S113 degree 3 poles (15.3295, -39.8235) (15.1855, -39.4771) (15.0439, -39.1443) (15.0146, -39.0813) knots 0 0 0 0 1 1 1 1
  spline S114 degree 3 poles (15.0146, -39.0813) (14.9854, -39.0206) (14.9629, -38.9554) (14.9629, -38.9419) knots 0 0 0 0 1 1 1 1
  spline S115 degree 3 poles (14.9629, -38.9419) (14.9629, -38.9261) (14.9562, -38.9126) (14.9472, -38.9126) knots 0 0 0 0 1 1 1 1
  spline S116 degree 3 poles (14.9472, -38.9126) (14.9382, -38.9126) (14.9314, -38.8991) (14.9314, -38.8856) knots 0 0 0 0 1 1 1 1
  spline S117 degree 3 poles (14.9314, -38.8856) (14.9314, -38.8699) (14.8639, -38.6922) (14.7785, -38.4921) knots 0 0 0 0 1 1 1 1
  spline S118 degree 3 poles (14.7785, -38.4921) (14.6863, -38.2694) (14.6323, -38.1143) (14.6413, -38.0895) knots 0 0 0 0 1 1 1 1
  spline S119 degree 3 poles (14.6413, -38.0895) (14.6548, -38.0558) (14.6818, -38.0535) (14.8977, -38.0693) knots 0 0 0 0 1 1 1 1
  spline S120 degree 3 poles (14.8977, -38.0693) (15.0304, -38.0783) (15.6601, -38.0895) (16.2965, -38.0918) knots 0 0 0 0 1 1 1 1
  spline S121 degree 3 poles (16.2965, -38.0918) (17.1039, -38.0963) (17.4547, -38.1053) (17.4615, -38.1233) knots 0 0 0 0 1 1 1 1
  spline S122 degree 3 poles (17.4615, -38.1233) (17.466, -38.1367) (17.4165, -38.2604) (17.3535, -38.3999) knots 0 0 0 0 1 1 1 1
  spline S123 degree 3 poles (17.3535, -38.3999) (17.2883, -38.5393) (17.2343, -38.6697) (17.2298, -38.6877) knots 0 0 0 0 1 1 1 1
  spline S124 degree 3 poles (17.2298, -38.6877) (17.2254, -38.708) (17.1511, -38.8789) (17.0612, -39.0701) knots 0 0 0 0 1 1 1 1
  spline S125 degree 3 poles (17.0612, -39.0701) (16.6474, -39.9651) (16.2223, -40.9052) (16.2223, -40.9322) knots 0 0 0 0 1 1 1 1
  spline S126 degree 3 poles (16.2223, -40.9322) (16.2223, -40.9457) (16.2111, -40.9592) (16.1998, -40.9592) knots 0 0 0 0 1 1 1 1
  spline S127 degree 3 poles (16.1998, -40.9592) (16.1863, -40.9592) (16.1818, -40.9659) (16.1908, -40.9727) knots 0 0 0 0 1 1 1 1
  spline S128 degree 3 poles (16.1908, -40.9727) (16.2021, -40.9862) (16.0896, -41.2313) (16.0424, -41.292) knots 0 0 0 0 1 1 1 1
  spline S129 degree 3 poles (16.0424, -41.292) (16.0177, -41.3235) (16.0019, -41.3258) (15.9682, -41.301) knots 0 0 0 0 1 1 1 1
  spline S130 degree 3 poles (2.1506, -42.5582) (2.1506, -42.5222) (2.1258, -42.5155) (1.9527, -42.502) knots 0 0 0 0 1 1 1 1
  spline S131 degree 3 poles (1.9527, -42.502) (0.682, -42.4008) (-0.2311, -41.9892) (-0.5549, -41.3685) knots 0 0 0 0 1 1 1 1
  spline S132 degree 3 poles (-0.5549, -41.3685) (-0.5976, -41.2853) (-0.6449, -41.1773) (-0.6584, -41.1279) knots 0 0 0 0 1 1 1 1
  spline S133 degree 3 poles (-0.6584, -41.1279) (-0.6764, -41.0649) (-0.6831, -39.756) (-0.6831, -36.612) knots 0 0 0 0 1 1 1 1
  line L20 (-0.6831, -36.612) -> (-0.6831, -32.1882)
  line L21 (-0.6831, -32.1882) -> (-1.1149, -32.1927)
  line L22 (-1.1149, -32.1927) -> (-1.549, -32.1995)
  line L23 (-1.549, -32.1995) -> (-1.549, -37.064)
  spline S134 degree 3 poles (-1.549, -37.064) (-1.549, -41.4202) (-1.5535, -41.9262) (-1.5827, -41.9262) knots 0 0 0 0 1 1 1 1
  spline S135 degree 3 poles (-1.5827, -41.9262) (-1.6029, -41.9262) (-1.6344, -41.897) (-1.6547, -41.8633) knots 0 0 0 0 1 1 1 1
  spline S136 degree 3 poles (-1.6547, -41.8633) (-1.6771, -41.8273) (-1.9088, -41.4944) (-2.1719, -41.1211) knots 0 0 0 0 1 1 1 1
  spline S137 degree 3 poles (-2.1719, -41.1211) (-2.435, -40.7478) (-2.7881, -40.2485) (-2.9546, -40.0101) knots 0 0 0 0 1 1 1 1
  spline S138 degree 3 poles (-2.9546, -40.0101) (-3.121, -39.774) (-3.2739, -39.5626) (-3.2941, -39.5446) knots 0 0 0 0 1 1 1 1
  spline S139 degree 3 poles (-3.2941, -39.5446) (-3.3121, -39.5244) (-3.4178, -39.3827) (-3.5258, -39.2275) knots 0 0 0 0 1 1 1 1
  spline S140 degree 3 poles (-3.5258, -39.2275) (-3.6337, -39.0723) (-3.9508, -38.6203) (-4.232, -38.2222) knots 0 0 0 0 1 1 1 1
  spline S141 degree 3 poles (-4.232, -38.2222) (-4.5131, -37.8241) (-4.9246, -37.2394) (-5.1473, -36.9223) knots 0 0 0 0 1 1 1 1
  spline S142 degree 3 poles (-5.1473, -36.9223) (-5.3699, -36.6075) (-5.5588, -36.3488) (-5.5701, -36.3488) knots 0 0 0 0 1 1 1 1
  spline S143 degree 3 poles (-5.5701, -36.3488) (-5.5791, -36.3488) (-5.5858, -36.3331) (-5.5858, -36.3151) knots 0 0 0 0 1 1 1 1
  spline S144 degree 3 poles (-5.5858, -36.3151) (-5.5858, -36.2971) (-5.5971, -36.2814) (-5.6083, -36.2814) knots 0 0 0 0 1 1 1 1
  spline S145 degree 3 poles (-5.6083, -36.2814) (-5.6218, -36.2814) (-5.6308, -36.2656) (-5.6308, -36.2476) knots 0 0 0 0 1 1 1 1
  spline S146 degree 3 poles (-5.6308, -36.2476) (-5.6308, -36.2274) (-5.6466, -36.2071) (-5.6645, -36.2004) knots 0 0 0 0 1 1 1 1
  spline S147 degree 3 poles (-5.6645, -36.2004) (-5.6825, -36.1914) (-5.6983, -36.1757) (-5.6983, -36.1599) knots 0 0 0 0 1 1 1 1
  spline S148 degree 3 poles (-5.6983, -36.1599) (-5.6983, -36.1464) (-5.759, -36.052) (-5.831, -35.9485) knots 0 0 0 0 1 1 1 1
  line L24 (-5.831, -35.9485) -> (-5.9637, -35.7641)
  line L25 (-5.9637, -35.7641) -> (-6.0626, -35.9035)
  spline S149 degree 3 poles (-6.0626, -35.9035) (-6.1188, -35.9822) (-6.355, -36.3286) (-6.5866, -36.6749) knots 0 0 0 0 1 1 1 1
  spline S150 degree 3 poles (-6.5866, -36.6749) (-6.8205, -37.0213) (-7.0589, -37.3698) (-7.1174, -37.4508) knots 0 0 0 0 1 1 1 1
  spline S151 degree 3 poles (-7.1174, -37.4508) (-7.2321, -37.6082) (-7.9068, -38.5978) (-8.7569, -39.8572) knots 0 0 0 0 1 1 1 1
  spline S152 degree 3 poles (-8.7569, -39.8572) (-9.0447, -40.2845) (-9.2989, -40.6556) (-9.3236, -40.6826) knots 0 0 0 0 1 1 1 1
  spline S153 degree 3 poles (-9.3236, -40.6826) (-9.3483, -40.7096) (-9.5485, -40.9974) (-9.7666, -41.3235) knots 0 0 0 0 1 1 1 1
  spline S154 degree 3 poles (-9.7666, -41.3235) (-9.987, -41.6496) (-10.1827, -41.9172) (-10.2029, -41.9217) knots 0 0 0 0 1 1 1 1
  spline S155 degree 3 poles (-10.2029, -41.9217) (-10.2389, -41.9285) (-10.2412, -41.6001) (-10.2412, -37.0595) knots 0 0 0 0 1 1 1 1
  line L26 (-10.2412, -37.0595) -> (-10.2412, -32.1882)
  line L27 (-10.2412, -32.1882) -> (-10.9721, -32.1927)
  line L28 (-10.9721, -32.1927) -> (-11.703, -32.1995)
  line L29 (-11.703, -32.1995) -> (-11.703, -37.3946)
  line L30 (-11.703, -37.3946) -> (-11.703, -42.5897)
  line L31 (-11.703, -42.5897) -> (-10.6752, -42.5942)
  line L32 (-10.6752, -42.5942) -> (-9.6452, -42.5987)
  line L33 (-9.6452, -42.5987) -> (-9.2516, -42.0432)
  spline S156 degree 3 poles (-9.2516, -42.0432) (-8.4195, -40.8737) (-8.0529, -40.3632) (-8.0349, -40.3565) knots 0 0 0 0 1 1 1 1
  spline S157 degree 3 poles (-8.0349, -40.3565) (-8.0237, -40.352) (-8.0147, -40.334) (-8.0147, -40.3182) knots 0 0 0 0 1 1 1 1
  spline S158 degree 3 poles (-8.0147, -40.3182) (-8.0147, -40.3002) (-8.0012, -40.2778) (-7.9855, -40.2688) knots 0 0 0 0 1 1 1 1
  spline S159 degree 3 poles (-7.9855, -40.2688) (-7.945, -40.2418) (-7.7448, -39.9651) (-7.7448, -39.9337) knots 0 0 0 0 1 1 1 1
  spline S160 degree 3 poles (-7.7448, -39.9337) (-7.7448, -39.9202) (-7.7291, -39.9022) (-7.7111, -39.8932) knots 0 0 0 0 1 1 1 1
  spline S161 degree 3 poles (-7.7111, -39.8932) (-7.6931, -39.8864) (-7.6774, -39.8662) (-7.6774, -39.846) knots 0 0 0 0 1 1 1 1
  spline S162 degree 3 poles (-7.6774, -39.846) (-7.6774, -39.828) (-7.6684, -39.8122) (-7.6549, -39.8122) knots 0 0 0 0 1 1 1 1
  spline S163 degree 3 poles (-7.6549, -39.8122) (-7.6436, -39.8122) (-7.6324, -39.7987) (-7.6324, -39.7807) knots 0 0 0 0 1 1 1 1
  spline S164 degree 3 poles (-7.6324, -39.7807) (-7.6324, -39.7627) (-7.6166, -39.7447) (-7.5987, -39.7358) knots 0 0 0 0 1 1 1 1
  spline S165 degree 3 poles (-7.5987, -39.7358) (-7.5807, -39.729) (-7.5649, -39.7088) (-7.5649, -39.6908) knots 0 0 0 0 1 1 1 1
  spline S166 degree 3 poles (-7.5649, -39.6908) (-7.5649, -39.6728) (-7.5559, -39.6548) (-7.5447, -39.6503) knots 0 0 0 0 1 1 1 1
  spline S167 degree 3 poles (-7.5447, -39.6503) (-7.5289, -39.6435) (-7.1331, -39.097) (-6.5124, -38.2222) knots 0 0 0 0 1 1 1 1
  spline S168 degree 3 poles (-6.5124, -38.2222) (-6.4045, -38.0715) (-6.301, -37.9478) (-6.283, -37.9478) knots 0 0 0 0 1 1 1 1
  spline S169 degree 3 poles (-6.283, -37.9478) (-6.2493, -37.9478) (-6.1886, -38.0243) (-5.4059, -39.0476) knots 0 0 0 0 1 1 1 1
  spline S170 degree 3 poles (-5.4059, -39.0476) (-5.1923, -39.3264) (-5.0011, -39.5693) (-4.9809, -39.5873) knots 0 0 0 0 1 1 1 1
  spline S171 degree 3 poles (-4.9809, -39.5873) (-4.9606, -39.6053) (-4.9359, -39.639) (-4.9269, -39.6615) knots 0 0 0 0 1 1 1 1
  spline S172 degree 3 poles (-4.9269, -39.6615) (-4.9201, -39.6818) (-4.9022, -39.6998) (-4.8887, -39.6998) knots 0 0 0 0 1 1 1 1
  spline S173 degree 3 poles (-4.8887, -39.6998) (-4.8774, -39.6998) (-4.8662, -39.7155) (-4.8662, -39.7335) knots 0 0 0 0 1 1 1 1
  spline S174 degree 3 poles (-4.8662, -39.7335) (-4.8662, -39.7515) (-4.8459, -39.7785) (-4.8212, -39.7942) knots 0 0 0 0 1 1 1 1
  spline S175 degree 3 poles (-4.8212, -39.7942) (-4.7964, -39.81) (-4.7762, -39.837) (-4.7762, -39.8527) knots 0 0 0 0 1 1 1 1
  spline S176 degree 3 poles (-4.7762, -39.8527) (-4.7762, -39.8684) (-4.7605, -39.8864) (-4.7425, -39.8932) knots 0 0 0 0 1 1 1 1
  spline S177 degree 3 poles (-4.7425, -39.8932) (-4.7245, -39.9022) (-4.7087, -39.9202) (-4.7087, -39.9382) knots 0 0 0 0 1 1 1 1
  spline S178 degree 3 poles (-4.7087, -39.9382) (-4.7087, -39.9539) (-4.6907, -39.9786) (-4.6705, -39.9899) knots 0 0 0 0 1 1 1 1
  spline S179 degree 3 poles (-4.6705, -39.9899) (-4.648, -40.0034) (-4.639, -40.0146) (-4.648, -40.0146) knots 0 0 0 0 1 1 1 1
  spline S180 degree 3 poles (-4.648, -40.0146) (-4.6638, -40.0146) (-4.5671, -40.1428) (-4.4546, -40.2733) knots 0 0 0 0 1 1 1 1
  spline S181 degree 3 poles (-4.4546, -40.2733) (-4.4321, -40.298) (-4.4006, -40.334) (-4.3849, -40.352) knots 0 0 0 0 1 1 1 1
  spline S182 degree 3 poles (-4.3849, -40.352) (-4.3557, -40.3857) (-4.1308, -40.6758) (-3.1457, -41.9577) knots 0 0 0 0 1 1 1 1
  line L34 (-3.1457, -41.9577) -> (-2.6509, -42.5987)
  line L35 (-2.6509, -42.5987) -> (-0.2513, -42.6009)
  spline S183 degree 3 poles (-0.2513, -42.6009) (2.0854, -42.6009) (2.1506, -42.5987) (2.1506, -42.5582) knots 0 0 0 0 1 1 1 1
  line L36 (-12.5126, -42.511) -> (-12.5126, -42.421)
  line L37 (-12.5126, -42.421) -> (-12.6251, -42.421)
  spline S184 degree 3 poles (-12.6251, -42.421) (-12.9714, -42.421) (-13.6034, -42.3063) (-13.9272, -42.1849) knots 0 0 0 0 1 1 1 1
  spline S185 degree 3 poles (-13.9272, -42.1849) (-14.5479, -41.9532) (-14.8853, -41.6541) (-15.0472, -41.1953) knots 0 0 0 0 1 1 1 1
  line L38 (-15.0472, -41.1953) -> (-15.1102, -41.0154)
  line L39 (-15.1102, -41.0154) -> (-15.1169, -36.603)
  line L40 (-15.1169, -36.603) -> (-15.1214, -32.1882)
  line L41 (-15.1214, -32.1882) -> (-18.4026, -32.1882)
  line L42 (-18.4026, -32.1882) -> (-21.6839, -32.1882)
  line L43 (-21.6839, -32.1882) -> (-21.6974, -32.3749)
  spline S186 degree 3 poles (-21.6974, -32.3749) (-21.7131, -32.5683) (-21.7783, -33.9964) (-21.7783, -34.1066) knots 0 0 0 0 1 1 1 1
  spline S187 degree 3 poles (-21.7783, -34.1066) (-21.7783, -34.1628) (-21.7626, -34.1493) (-21.6389, -33.9852) knots 0 0 0 0 1 1 1 1
  spline S188 degree 3 poles (-21.6389, -33.9852) (-21.2678, -33.4926) (-20.7303, -33.0811) (-20.2378, -32.9124) knots 0 0 0 0 1 1 1 1
  spline S189 degree 3 poles (-20.2378, -32.9124) (-19.9117, -32.8022) (-19.8195, -32.7955) (-18.3712, -32.7955) knots 0 0 0 0 1 1 1 1
  spline S190 degree 3 poles (-18.3712, -32.7955) (-17.6268, -32.7955) (-16.9858, -32.8022) (-16.9476, -32.809) knots 0 0 0 0 1 1 1 1
  spline S191 degree 3 poles (-16.9476, -32.809) (-16.8509, -32.8292) (-16.6979, -32.9641) (-16.6485, -33.0743) knots 0 0 0 0 1 1 1 1
  spline S192 degree 3 poles (-16.6485, -33.0743) (-16.608, -33.162) (-16.6057, -33.2677) (-16.6057, -35.0467) knots 0 0 0 0 1 1 1 1
  spline S193 degree 3 poles (-16.6057, -35.0467) (-16.6057, -36.8391) (-16.608, -36.9291) (-16.6462, -36.9628) knots 0 0 0 0 1 1 1 1
  spline S194 degree 3 poles (-16.6462, -36.9628) (-16.6844, -36.9965) (-16.8171, -37.001) (-18.0968, -37.001) knots 0 0 0 0 1 1 1 1
  spline S195 degree 3 poles (-18.0968, -37.001) (-19.4664, -37.001) (-19.5069, -37.0033) (-19.5294, -37.0438) knots 0 0 0 0 1 1 1 1
  spline S196 degree 3 poles (-19.5294, -37.0438) (-19.5406, -37.0685) (-19.5519, -37.2192) (-19.5519, -37.3811) knots 0 0 0 0 1 1 1 1
  spline S197 degree 3 poles (-19.5519, -37.3811) (-19.5519, -37.6577) (-19.5496, -37.6757) (-19.5024, -37.7072) knots 0 0 0 0 1 1 1 1
  spline S198 degree 3 poles (-19.5024, -37.7072) (-19.4574, -37.7387) (-19.282, -37.7432) (-18.0563, -37.7432) knots 0 0 0 0 1 1 1 1
  spline S199 degree 3 poles (-18.0563, -37.7432) (-16.9993, -37.7432) (-16.653, -37.7499) (-16.6327, -37.7702) knots 0 0 0 0 1 1 1 1
  spline S200 degree 3 poles (-16.6327, -37.7702) (-16.6125, -37.7904) (-16.6057, -38.2694) (-16.6057, -39.7852) knots 0 0 0 0 1 1 1 1
  spline S201 degree 3 poles (-16.6057, -39.7852) (-16.6057, -41.9982) (-16.5967, -41.8655) (-16.7587, -41.9892) knots 0 0 0 0 1 1 1 1
  line L44 (-16.7587, -41.9892) -> (-16.8374, -42.0499)
  line L45 (-16.8374, -42.0499) -> (-18.4589, -42.0567)
  spline S202 degree 3 poles (-18.4589, -42.0567) (-19.9139, -42.0634) (-20.0939, -42.0589) (-20.2221, -42.0252) knots 0 0 0 0 1 1 1 1
  spline S203 degree 3 poles (-20.2221, -42.0252) (-20.4807, -41.9577) (-20.7438, -41.7418) (-20.8675, -41.5012) knots 0 0 0 0 1 1 1 1
  spline S204 degree 3 poles (-20.8675, -41.5012) (-20.899, -41.4382) (-20.917, -41.3865) (-20.9102, -41.3865) knots 0 0 0 0 1 1 1 1
  spline S205 degree 3 poles (-20.9102, -41.3865) (-20.9012, -41.3865) (-20.908, -41.3707) (-20.9237, -41.3528) knots 0 0 0 0 1 1 1 1
  spline S206 degree 3 poles (-20.9237, -41.3528) (-20.9372, -41.3348) (-20.944, -41.31) (-20.9372, -41.2988) knots 0 0 0 0 1 1 1 1
  spline S207 degree 3 poles (-20.9372, -41.2988) (-20.9282, -41.2875) (-20.9305, -41.2718) (-20.9417, -41.265) knots 0 0 0 0 1 1 1 1
  spline S208 degree 3 poles (-20.9417, -41.265) (-20.9507, -41.2605) (-20.962, -41.2111) (-20.9642, -41.1571) knots 0 0 0 0 1 1 1 1
  spline S209 degree 3 poles (-20.9642, -41.1571) (-20.971, -41.0222) (-20.9934, -40.8377) (-21.0069, -40.8198) knots 0 0 0 0 1 1 1 1
  spline S210 degree 3 poles (-21.0069, -40.8198) (-21.0114, -40.8085) (-21.1216, -40.8018) (-21.2521, -40.8018) knots 0 0 0 0 1 1 1 1
  line L46 (-21.2521, -40.8018) -> (-21.4882, -40.8018)
  line L47 (-21.4882, -40.8018) -> (-21.4747, -40.9322)
  spline S211 degree 3 poles (-21.4747, -40.9322) (-21.468, -41.0019) (-21.4477, -41.328) (-21.4297, -41.6564) knots 0 0 0 0 1 1 1 1
  spline S212 degree 3 poles (-21.4297, -41.6564) (-21.4118, -41.9847) (-21.3893, -42.3311) (-21.3825, -42.4278) knots 0 0 0 0 1 1 1 1
  line L48 (-21.3825, -42.4278) -> (-21.369, -42.6009)
  line L49 (-21.369, -42.6009) -> (-16.9408, -42.6009)
  line L50 (-16.9408, -42.6009) -> (-12.5126, -42.6009)
  line L51 (-12.5126, -42.6009) -> (-12.5126, -42.511)
extrude "Extrude6" cut sketch "Sketch5" along normal blind 1 contours S0 S1 S2 S3 S4 S5 S6 S7 S8 S9 S10 L0 L1 S11 S12 S13 S14 S15 S16 S17 S18 S19 L2 L3 L4 L5 S20 S21 | L6 L7 S22 S23 S24 S25 S26 S27 S28 S29 S30 S31 S32 S33 S34 S35 S36 S37 S38 S39 S40 S41 S42 L8 L9 L10 L11 S43 S44 S45 S46 S47 S48 S49 S50 S51 S52 S53 S54 S55 S56 S57 L12 L13 S58 S59 S60 S61 S62 S63 S64 S65 S66 S67 S68 S69 S70 S71 S72 S73 S74 S75 S76 S77 S78 S79 S80 S81 S82 S83 S84 S85 S86 S87 S88 S89 S90 S91 S92 S93 S94 S95 S96 S97 S98 S99 S100 S101 S102 S103 L14 L15 S104 S105 S106 S107 S108 S109 S110 S111 L16 L17 L18 L19 | S130 S131 S132 S133 L20 L21 L22 L23 S134 S135 S136 S137 S138 S139 S140 S141 S142 S143 S144 S145 S146 S147 S148 L24 L25 S149 S150 S151 S152 S153 S154 S155 L26 L27 L28 L29 L30 L31 L32 L33 S156 S157 S158 S159 S160 S161 S162 S163 S164 S165 S166 S167 S168 S169 S170 S171 S172 S173 S174 S175 S176 S177 S178 S179 S180 S181 S182 L34 L35 S183 | L36 L37 S184 S185 L38 L39 L40 L41 L42 L43 S186 S187 S188 S189 S190 S191 S192 S193 S194 S195 S196 S197 S198 S199 S200 S201 L44 L45 S202 S203 S204 S205 S206 S207 S208 S209 S210 L46 L47 S211 S212 L48 L49 L50 L51
equation "d4 = 8 mm - 0.125 mm"
